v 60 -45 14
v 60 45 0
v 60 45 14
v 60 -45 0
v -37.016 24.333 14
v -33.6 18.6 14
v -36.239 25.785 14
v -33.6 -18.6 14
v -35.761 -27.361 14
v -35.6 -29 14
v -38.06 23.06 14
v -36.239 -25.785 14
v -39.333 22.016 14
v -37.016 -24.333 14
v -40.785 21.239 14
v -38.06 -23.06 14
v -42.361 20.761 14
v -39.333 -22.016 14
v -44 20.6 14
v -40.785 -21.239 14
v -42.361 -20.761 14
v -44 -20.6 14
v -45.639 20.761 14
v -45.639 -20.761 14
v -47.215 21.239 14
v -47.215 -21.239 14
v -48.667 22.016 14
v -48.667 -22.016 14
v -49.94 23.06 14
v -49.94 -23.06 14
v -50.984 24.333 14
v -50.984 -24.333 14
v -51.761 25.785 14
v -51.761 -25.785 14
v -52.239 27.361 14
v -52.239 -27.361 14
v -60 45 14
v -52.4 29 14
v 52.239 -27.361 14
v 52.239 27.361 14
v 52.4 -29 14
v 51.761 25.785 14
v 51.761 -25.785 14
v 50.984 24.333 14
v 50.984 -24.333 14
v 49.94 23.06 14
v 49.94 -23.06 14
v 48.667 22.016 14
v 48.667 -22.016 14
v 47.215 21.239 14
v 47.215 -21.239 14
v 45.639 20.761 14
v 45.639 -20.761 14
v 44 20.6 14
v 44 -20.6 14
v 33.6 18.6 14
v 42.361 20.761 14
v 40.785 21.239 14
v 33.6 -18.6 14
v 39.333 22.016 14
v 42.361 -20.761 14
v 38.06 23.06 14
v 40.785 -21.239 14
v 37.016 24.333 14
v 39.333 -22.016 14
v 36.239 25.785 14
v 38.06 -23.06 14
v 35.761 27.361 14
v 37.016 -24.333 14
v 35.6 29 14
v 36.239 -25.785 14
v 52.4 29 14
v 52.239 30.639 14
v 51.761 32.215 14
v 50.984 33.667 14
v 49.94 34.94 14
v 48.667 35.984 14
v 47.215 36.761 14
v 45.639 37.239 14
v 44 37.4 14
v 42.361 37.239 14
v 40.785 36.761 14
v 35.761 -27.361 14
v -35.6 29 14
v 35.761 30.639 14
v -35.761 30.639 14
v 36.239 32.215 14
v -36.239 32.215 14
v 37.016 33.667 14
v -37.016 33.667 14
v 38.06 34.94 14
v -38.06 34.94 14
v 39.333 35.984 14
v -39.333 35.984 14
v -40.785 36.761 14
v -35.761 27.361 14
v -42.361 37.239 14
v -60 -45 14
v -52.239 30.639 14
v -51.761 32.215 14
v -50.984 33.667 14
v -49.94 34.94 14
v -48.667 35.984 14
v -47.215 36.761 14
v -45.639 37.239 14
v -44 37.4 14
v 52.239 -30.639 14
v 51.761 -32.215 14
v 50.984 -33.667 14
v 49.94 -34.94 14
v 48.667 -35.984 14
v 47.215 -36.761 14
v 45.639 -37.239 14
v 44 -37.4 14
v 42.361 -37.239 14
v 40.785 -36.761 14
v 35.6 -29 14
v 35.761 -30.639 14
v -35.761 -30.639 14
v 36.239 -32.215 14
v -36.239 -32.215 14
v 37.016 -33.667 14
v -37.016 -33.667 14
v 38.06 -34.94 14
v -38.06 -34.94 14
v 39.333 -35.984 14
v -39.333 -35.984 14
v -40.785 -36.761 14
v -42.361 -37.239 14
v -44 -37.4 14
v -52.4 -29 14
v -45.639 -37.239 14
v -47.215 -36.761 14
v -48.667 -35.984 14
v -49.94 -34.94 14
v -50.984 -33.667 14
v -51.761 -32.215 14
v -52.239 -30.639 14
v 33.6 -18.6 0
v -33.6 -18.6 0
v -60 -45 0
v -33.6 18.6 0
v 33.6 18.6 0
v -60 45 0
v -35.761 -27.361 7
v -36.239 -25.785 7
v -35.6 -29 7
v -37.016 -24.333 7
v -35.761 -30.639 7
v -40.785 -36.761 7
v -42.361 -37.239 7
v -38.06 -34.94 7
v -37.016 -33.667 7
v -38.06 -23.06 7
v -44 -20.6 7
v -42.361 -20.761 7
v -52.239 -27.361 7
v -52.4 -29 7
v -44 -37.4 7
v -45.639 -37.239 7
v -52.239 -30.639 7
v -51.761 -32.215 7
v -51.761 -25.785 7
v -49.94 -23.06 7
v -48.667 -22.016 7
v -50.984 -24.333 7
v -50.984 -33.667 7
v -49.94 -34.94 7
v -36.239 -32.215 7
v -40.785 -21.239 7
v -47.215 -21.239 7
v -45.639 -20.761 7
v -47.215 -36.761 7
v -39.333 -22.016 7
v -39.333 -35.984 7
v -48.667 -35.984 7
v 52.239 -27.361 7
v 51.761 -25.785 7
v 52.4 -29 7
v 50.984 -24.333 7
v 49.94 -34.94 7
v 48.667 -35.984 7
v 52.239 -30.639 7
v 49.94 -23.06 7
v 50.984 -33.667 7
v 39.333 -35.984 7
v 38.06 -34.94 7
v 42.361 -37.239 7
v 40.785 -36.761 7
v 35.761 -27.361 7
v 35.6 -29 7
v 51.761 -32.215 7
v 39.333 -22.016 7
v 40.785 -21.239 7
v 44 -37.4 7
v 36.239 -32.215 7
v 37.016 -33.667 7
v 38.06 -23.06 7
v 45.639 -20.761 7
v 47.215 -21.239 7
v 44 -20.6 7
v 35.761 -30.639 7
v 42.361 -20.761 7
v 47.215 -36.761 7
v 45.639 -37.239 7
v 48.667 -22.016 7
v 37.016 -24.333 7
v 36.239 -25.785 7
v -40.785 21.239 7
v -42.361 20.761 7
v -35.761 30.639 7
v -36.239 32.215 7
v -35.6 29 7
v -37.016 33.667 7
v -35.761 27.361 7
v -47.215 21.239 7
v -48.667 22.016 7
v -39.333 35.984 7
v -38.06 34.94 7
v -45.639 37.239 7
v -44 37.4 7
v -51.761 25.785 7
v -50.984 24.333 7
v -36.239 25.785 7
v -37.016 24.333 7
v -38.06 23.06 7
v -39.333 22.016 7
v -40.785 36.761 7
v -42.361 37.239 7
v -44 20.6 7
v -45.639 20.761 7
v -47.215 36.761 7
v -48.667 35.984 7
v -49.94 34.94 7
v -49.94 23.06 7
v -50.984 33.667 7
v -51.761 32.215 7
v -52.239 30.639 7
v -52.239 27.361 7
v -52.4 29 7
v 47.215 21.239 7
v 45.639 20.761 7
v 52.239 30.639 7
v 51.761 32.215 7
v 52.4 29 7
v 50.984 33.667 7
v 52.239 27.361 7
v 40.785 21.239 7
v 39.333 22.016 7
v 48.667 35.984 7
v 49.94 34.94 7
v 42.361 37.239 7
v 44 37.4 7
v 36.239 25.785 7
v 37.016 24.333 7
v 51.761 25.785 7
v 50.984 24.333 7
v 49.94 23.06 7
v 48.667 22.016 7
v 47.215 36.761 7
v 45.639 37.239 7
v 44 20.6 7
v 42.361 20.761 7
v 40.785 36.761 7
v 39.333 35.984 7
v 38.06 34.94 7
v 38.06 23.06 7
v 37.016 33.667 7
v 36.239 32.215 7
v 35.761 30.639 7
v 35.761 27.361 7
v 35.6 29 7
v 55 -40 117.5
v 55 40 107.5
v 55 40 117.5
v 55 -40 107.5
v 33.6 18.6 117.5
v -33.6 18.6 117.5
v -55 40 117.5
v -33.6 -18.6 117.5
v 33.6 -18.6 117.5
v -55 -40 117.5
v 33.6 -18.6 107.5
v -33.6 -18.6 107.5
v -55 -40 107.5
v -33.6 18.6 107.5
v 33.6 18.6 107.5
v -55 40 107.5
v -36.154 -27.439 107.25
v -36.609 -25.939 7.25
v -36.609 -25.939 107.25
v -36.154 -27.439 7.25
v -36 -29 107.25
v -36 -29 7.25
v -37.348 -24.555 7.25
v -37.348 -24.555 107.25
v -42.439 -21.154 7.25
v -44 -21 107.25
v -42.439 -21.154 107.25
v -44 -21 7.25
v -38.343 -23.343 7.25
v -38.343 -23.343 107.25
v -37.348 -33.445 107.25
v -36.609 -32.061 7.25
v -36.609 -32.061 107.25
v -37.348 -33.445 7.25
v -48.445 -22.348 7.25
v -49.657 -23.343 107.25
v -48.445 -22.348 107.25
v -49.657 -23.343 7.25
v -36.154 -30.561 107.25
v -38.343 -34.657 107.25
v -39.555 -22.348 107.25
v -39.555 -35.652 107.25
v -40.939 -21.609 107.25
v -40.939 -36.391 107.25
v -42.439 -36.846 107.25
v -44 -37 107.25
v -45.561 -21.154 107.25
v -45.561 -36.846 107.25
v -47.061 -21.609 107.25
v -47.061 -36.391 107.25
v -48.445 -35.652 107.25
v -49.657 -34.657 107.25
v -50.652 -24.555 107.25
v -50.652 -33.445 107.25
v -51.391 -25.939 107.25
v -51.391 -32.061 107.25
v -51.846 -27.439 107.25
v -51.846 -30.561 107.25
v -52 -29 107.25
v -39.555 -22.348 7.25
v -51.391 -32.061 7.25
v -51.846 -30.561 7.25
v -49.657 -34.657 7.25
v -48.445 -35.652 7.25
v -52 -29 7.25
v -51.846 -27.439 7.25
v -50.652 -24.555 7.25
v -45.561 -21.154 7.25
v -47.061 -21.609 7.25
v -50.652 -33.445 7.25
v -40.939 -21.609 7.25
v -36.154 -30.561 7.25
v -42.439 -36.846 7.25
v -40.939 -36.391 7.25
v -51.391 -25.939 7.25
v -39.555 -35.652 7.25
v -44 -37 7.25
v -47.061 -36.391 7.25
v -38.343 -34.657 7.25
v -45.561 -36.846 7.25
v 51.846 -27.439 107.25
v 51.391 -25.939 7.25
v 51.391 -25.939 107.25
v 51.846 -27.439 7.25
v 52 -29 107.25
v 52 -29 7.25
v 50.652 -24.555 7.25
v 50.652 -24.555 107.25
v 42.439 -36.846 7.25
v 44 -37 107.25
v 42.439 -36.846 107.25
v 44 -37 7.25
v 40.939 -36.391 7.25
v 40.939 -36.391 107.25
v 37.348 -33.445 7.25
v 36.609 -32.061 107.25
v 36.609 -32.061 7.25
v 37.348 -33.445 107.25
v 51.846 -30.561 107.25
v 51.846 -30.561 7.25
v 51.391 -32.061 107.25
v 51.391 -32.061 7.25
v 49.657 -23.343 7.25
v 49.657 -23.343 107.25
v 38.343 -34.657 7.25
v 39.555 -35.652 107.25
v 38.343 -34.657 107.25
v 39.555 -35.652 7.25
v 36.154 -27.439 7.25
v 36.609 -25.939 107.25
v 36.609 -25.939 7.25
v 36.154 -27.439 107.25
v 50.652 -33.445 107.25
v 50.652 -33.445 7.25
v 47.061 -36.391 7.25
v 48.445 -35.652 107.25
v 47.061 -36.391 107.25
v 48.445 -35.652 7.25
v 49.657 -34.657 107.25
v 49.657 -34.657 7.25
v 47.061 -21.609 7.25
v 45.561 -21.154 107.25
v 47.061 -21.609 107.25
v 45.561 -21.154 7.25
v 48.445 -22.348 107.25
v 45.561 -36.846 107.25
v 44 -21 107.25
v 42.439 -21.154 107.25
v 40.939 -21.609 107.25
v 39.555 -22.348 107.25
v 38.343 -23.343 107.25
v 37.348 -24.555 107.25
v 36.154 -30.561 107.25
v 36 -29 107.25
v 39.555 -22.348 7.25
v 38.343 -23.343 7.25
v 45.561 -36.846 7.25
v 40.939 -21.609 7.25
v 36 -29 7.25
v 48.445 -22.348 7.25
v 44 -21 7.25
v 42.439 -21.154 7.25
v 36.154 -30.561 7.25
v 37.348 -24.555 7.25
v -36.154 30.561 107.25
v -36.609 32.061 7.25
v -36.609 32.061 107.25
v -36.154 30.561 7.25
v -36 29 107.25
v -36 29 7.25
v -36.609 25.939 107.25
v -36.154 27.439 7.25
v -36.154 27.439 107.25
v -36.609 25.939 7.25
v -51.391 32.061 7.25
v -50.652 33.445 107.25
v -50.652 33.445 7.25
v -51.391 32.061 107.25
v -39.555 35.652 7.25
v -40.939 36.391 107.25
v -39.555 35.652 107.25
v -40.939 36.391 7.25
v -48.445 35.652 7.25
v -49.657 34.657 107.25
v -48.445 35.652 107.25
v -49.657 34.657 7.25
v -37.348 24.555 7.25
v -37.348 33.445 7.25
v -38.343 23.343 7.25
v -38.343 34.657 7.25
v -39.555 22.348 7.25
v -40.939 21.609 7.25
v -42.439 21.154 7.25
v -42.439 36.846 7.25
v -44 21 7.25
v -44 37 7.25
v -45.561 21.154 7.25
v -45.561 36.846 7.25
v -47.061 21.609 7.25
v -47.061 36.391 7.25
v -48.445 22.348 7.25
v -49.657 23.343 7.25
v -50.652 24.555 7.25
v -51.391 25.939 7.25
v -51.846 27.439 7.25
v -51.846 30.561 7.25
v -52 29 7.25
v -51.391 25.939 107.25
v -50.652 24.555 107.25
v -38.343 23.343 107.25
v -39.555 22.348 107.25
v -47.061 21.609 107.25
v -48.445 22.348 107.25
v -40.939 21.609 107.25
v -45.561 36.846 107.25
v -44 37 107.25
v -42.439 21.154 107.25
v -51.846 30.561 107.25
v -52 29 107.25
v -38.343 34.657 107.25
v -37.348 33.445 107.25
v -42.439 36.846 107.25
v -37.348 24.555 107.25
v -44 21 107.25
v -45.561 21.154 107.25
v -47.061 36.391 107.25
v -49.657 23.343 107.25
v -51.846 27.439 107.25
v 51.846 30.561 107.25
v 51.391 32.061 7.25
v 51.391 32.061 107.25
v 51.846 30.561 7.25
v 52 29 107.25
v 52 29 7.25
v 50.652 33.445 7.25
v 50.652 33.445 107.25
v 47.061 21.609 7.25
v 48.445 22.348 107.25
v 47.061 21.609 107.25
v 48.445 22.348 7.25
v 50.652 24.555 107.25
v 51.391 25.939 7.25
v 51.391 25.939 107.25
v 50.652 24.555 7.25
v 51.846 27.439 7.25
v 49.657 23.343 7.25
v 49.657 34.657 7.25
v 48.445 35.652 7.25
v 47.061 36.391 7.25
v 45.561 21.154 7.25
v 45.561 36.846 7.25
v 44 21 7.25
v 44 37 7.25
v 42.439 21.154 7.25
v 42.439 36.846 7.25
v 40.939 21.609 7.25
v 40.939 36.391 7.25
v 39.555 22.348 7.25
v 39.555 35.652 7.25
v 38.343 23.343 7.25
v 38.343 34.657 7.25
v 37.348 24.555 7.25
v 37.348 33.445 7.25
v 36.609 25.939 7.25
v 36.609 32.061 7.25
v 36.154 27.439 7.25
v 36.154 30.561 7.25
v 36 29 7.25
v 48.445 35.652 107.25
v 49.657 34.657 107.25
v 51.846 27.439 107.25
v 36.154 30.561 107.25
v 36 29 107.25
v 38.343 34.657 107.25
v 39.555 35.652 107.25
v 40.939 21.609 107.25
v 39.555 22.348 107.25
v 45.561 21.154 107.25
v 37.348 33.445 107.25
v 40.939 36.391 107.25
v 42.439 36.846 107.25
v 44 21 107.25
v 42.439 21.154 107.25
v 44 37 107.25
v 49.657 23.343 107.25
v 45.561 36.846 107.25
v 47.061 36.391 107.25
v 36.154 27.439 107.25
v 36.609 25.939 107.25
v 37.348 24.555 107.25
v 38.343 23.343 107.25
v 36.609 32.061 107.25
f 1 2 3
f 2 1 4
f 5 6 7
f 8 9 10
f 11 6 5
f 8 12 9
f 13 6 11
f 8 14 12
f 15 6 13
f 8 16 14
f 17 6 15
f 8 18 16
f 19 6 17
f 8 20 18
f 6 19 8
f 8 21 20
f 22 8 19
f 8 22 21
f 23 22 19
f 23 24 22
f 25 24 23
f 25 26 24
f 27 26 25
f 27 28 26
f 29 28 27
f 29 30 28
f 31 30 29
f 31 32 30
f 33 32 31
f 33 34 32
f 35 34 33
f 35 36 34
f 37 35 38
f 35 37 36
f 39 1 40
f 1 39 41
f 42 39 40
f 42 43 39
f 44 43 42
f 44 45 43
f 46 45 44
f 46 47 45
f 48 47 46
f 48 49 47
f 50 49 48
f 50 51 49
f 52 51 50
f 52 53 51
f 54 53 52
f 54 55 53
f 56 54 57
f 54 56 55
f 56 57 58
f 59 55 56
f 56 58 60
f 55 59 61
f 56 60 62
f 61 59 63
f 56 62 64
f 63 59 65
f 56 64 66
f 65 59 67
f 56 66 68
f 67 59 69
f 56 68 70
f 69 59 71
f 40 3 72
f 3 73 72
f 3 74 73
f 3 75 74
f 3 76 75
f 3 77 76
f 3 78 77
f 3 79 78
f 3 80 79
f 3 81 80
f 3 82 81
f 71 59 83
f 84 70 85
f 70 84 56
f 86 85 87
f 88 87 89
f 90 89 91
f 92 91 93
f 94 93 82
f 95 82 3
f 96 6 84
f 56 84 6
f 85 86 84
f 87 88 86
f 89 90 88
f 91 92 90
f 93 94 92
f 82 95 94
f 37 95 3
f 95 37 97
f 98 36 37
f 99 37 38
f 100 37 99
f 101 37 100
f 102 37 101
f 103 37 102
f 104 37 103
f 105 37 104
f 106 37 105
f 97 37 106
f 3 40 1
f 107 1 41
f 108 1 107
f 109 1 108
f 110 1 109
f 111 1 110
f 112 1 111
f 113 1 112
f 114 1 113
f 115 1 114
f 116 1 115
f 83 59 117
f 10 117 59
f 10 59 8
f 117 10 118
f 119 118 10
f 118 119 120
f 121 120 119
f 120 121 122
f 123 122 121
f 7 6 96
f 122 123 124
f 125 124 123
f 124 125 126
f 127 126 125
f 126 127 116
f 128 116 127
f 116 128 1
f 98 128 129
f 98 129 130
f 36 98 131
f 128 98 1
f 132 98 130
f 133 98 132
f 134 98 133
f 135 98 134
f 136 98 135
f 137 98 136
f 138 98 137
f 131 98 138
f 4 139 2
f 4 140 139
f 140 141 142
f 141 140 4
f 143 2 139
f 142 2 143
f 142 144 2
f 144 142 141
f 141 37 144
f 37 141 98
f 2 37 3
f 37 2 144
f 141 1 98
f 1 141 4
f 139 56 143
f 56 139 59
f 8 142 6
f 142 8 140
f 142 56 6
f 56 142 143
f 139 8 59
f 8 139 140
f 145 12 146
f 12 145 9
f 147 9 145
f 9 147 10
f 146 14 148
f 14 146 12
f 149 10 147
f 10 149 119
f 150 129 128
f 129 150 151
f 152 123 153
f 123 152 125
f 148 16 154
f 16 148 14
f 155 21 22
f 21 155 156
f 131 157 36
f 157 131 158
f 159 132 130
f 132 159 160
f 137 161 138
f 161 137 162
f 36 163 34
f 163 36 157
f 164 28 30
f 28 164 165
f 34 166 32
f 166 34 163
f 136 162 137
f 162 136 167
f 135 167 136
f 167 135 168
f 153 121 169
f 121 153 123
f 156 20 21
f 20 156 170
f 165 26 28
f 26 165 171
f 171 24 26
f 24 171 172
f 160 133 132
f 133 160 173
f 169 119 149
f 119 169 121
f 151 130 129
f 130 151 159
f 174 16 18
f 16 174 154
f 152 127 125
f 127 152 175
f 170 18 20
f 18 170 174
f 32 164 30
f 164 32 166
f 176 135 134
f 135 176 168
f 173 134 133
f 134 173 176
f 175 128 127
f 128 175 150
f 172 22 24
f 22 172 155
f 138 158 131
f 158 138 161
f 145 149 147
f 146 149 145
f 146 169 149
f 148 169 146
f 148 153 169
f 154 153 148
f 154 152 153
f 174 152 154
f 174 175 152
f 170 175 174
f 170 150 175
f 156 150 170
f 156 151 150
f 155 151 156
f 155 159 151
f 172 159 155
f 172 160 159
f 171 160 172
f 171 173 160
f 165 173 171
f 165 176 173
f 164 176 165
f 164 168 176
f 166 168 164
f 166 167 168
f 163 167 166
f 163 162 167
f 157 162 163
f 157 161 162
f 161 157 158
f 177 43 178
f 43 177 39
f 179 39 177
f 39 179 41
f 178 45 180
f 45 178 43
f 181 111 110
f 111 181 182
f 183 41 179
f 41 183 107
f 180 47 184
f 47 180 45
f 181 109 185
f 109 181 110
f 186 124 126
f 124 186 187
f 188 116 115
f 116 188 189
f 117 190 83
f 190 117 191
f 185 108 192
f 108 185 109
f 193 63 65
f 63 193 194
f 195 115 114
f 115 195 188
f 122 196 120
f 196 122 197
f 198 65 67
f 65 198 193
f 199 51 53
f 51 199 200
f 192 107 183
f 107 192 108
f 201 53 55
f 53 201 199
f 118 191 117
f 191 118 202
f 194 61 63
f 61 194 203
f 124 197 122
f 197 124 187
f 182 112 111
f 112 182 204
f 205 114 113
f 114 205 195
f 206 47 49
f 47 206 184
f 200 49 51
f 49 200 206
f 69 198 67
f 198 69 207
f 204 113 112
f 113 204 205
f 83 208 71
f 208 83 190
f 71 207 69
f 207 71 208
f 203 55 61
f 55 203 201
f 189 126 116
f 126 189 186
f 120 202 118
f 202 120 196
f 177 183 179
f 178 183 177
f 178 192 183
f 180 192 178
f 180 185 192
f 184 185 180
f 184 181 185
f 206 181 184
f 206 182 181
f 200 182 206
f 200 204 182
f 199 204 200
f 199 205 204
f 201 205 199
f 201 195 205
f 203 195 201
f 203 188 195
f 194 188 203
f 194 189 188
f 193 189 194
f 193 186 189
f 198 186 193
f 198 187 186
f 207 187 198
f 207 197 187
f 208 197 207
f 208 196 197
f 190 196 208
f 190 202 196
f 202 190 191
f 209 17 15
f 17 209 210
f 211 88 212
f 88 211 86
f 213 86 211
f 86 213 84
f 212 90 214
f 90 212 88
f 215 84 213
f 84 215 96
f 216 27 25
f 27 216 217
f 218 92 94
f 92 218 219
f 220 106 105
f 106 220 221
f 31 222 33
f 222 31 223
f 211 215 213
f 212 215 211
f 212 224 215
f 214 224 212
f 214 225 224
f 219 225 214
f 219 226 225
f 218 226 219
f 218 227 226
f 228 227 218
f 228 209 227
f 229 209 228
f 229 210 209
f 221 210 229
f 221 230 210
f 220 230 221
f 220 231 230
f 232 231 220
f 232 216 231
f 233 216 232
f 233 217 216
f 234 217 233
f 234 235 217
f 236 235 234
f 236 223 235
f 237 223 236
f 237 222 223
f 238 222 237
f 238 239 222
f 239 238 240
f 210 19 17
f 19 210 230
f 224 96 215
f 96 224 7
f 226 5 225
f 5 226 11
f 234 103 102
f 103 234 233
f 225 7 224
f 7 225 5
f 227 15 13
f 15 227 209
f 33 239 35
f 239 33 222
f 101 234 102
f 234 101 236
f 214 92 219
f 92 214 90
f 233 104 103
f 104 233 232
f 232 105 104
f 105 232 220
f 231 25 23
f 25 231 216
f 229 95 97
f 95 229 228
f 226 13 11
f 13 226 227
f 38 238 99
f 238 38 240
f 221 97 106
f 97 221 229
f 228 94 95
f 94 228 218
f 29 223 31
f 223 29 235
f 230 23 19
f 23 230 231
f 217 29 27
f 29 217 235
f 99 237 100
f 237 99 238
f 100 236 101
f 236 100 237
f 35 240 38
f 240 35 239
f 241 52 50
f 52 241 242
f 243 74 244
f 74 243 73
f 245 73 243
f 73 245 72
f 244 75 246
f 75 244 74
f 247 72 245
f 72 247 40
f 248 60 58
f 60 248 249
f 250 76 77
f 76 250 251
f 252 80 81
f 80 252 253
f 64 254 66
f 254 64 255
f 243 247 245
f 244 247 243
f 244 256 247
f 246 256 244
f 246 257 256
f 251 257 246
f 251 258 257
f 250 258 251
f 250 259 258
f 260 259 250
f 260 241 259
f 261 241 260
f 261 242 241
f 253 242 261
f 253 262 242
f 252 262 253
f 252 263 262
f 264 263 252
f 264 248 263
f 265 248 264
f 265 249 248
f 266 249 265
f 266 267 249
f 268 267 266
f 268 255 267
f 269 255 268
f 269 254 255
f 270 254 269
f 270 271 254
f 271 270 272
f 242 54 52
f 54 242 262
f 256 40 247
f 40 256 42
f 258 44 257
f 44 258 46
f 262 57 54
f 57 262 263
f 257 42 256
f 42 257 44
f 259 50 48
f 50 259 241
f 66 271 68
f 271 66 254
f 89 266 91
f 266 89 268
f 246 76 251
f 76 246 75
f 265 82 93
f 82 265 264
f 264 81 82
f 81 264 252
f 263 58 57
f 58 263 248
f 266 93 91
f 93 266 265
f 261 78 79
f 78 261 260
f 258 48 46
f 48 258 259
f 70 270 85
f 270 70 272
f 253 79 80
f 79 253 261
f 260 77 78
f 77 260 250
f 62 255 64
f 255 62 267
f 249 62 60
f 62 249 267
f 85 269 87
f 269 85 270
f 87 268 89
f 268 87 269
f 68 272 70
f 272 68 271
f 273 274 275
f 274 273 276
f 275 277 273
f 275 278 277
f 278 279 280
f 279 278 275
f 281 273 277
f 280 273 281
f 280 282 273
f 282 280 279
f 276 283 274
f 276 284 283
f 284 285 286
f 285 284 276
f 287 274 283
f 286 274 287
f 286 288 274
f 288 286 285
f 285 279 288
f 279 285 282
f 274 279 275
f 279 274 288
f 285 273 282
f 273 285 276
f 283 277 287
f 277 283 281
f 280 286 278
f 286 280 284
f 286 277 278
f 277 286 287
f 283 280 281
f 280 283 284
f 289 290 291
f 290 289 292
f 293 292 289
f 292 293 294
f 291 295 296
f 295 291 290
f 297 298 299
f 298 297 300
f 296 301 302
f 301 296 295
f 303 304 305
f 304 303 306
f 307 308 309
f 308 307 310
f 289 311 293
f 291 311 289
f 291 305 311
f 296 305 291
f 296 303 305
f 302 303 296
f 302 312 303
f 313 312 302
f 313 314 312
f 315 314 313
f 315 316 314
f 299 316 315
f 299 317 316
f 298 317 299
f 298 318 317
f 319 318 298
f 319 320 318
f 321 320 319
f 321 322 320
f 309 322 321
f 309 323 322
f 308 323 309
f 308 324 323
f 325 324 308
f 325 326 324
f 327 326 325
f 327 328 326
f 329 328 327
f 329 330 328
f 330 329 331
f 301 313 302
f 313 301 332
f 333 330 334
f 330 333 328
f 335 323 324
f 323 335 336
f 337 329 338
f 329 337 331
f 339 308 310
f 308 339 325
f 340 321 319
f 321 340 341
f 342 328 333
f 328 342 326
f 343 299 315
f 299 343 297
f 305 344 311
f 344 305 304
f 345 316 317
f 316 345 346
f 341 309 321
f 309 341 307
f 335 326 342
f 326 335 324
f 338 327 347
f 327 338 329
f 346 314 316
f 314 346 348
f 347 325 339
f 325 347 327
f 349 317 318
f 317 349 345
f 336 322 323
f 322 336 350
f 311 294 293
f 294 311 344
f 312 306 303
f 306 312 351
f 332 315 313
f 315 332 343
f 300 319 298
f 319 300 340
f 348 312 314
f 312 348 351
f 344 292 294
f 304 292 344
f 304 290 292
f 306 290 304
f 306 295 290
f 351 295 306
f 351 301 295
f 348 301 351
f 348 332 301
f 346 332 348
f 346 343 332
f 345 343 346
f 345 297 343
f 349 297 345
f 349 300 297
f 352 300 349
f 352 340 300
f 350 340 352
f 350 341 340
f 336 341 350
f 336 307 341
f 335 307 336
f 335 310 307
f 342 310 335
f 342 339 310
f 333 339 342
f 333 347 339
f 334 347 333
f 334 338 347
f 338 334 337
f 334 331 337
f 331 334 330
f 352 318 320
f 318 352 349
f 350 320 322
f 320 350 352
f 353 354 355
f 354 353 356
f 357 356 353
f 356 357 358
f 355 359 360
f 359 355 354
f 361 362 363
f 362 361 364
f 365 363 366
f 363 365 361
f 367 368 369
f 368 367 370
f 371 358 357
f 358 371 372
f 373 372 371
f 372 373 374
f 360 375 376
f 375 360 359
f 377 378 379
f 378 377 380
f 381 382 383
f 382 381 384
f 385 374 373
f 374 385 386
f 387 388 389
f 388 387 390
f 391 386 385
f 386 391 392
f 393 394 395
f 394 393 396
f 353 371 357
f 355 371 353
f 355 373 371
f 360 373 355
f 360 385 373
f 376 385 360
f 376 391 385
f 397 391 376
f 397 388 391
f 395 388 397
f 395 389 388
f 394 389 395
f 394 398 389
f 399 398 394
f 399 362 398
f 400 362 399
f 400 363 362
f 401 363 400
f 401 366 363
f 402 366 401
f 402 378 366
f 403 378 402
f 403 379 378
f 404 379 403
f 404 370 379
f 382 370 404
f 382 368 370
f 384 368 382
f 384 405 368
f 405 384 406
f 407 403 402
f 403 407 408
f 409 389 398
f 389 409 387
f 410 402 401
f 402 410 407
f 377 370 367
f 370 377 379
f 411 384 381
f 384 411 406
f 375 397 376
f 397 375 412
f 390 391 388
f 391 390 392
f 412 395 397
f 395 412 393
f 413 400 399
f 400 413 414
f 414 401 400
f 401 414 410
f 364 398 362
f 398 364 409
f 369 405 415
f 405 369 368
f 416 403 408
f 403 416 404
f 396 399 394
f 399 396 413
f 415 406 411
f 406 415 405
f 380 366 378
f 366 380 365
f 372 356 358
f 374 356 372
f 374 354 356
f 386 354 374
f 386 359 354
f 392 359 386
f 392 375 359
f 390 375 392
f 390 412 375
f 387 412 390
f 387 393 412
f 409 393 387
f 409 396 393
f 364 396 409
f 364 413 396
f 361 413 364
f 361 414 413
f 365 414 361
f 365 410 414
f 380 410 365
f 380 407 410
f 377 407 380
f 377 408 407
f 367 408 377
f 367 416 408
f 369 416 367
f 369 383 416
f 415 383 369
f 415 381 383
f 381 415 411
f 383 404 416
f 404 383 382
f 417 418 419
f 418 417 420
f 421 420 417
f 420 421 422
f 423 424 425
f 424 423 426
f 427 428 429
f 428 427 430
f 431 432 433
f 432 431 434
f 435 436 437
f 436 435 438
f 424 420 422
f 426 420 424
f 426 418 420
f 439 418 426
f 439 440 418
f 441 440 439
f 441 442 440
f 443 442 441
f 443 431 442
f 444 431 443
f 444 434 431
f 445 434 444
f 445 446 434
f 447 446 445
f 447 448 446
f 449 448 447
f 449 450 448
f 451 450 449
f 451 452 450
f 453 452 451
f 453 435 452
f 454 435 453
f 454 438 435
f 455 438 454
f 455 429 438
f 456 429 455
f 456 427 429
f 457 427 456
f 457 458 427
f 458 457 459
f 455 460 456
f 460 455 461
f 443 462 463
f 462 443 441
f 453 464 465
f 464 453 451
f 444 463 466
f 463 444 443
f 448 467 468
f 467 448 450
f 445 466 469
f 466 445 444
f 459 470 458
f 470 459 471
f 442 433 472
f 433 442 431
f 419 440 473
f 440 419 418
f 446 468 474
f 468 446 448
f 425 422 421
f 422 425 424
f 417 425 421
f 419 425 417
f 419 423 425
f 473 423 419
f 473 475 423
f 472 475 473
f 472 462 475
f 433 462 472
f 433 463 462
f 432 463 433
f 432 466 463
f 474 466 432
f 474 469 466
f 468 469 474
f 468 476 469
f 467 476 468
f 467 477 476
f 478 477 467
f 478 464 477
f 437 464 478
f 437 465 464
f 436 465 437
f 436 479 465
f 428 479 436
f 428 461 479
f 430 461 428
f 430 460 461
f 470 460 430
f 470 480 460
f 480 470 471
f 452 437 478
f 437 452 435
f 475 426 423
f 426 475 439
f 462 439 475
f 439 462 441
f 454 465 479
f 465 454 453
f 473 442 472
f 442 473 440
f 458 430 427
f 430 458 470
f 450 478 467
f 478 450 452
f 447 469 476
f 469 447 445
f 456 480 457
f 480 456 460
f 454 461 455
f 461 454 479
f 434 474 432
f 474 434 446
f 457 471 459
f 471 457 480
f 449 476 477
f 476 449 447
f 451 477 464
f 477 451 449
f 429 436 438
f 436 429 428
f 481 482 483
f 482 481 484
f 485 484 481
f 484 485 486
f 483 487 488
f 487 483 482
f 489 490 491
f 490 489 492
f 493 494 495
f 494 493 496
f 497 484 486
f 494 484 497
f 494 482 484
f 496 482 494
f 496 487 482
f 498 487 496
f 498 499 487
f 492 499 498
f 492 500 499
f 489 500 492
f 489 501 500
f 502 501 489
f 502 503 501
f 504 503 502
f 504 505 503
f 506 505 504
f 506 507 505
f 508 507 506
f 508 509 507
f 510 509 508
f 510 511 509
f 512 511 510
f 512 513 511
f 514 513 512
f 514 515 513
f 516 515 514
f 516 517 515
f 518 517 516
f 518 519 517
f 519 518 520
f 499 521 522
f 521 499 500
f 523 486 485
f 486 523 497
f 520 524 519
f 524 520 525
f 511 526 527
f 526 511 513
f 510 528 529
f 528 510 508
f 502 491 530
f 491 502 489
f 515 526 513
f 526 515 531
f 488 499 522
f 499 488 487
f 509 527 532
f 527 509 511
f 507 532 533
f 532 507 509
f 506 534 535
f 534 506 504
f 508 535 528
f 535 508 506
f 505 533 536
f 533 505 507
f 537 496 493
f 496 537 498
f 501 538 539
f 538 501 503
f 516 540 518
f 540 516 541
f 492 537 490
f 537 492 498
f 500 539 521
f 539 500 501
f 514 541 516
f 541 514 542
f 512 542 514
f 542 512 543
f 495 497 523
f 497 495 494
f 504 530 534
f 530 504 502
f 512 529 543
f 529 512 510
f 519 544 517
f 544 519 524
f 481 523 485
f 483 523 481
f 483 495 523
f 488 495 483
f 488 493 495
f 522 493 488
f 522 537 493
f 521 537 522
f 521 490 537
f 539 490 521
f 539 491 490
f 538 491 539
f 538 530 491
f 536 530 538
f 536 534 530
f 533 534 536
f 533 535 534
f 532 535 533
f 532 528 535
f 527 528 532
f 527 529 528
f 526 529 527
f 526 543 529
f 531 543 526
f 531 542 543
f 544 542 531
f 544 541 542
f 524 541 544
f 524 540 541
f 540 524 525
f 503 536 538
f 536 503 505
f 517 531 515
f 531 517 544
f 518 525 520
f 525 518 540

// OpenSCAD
$fn = 32;

// ------------------------------------------------------------------------
// Frame cube: base 120 x 90 mm, posts 100 mm tall
// Every part is its own module, assembly() places every instance.
// ------------------------------------------------------------------------

// --- part 1 ---
module base_frame() {
  difference() {
    translate([-60, -45, 0]) cube([120, 90, 14]);
    translate([-33.6, -18.6, -1]) cube([67.2, 37.2, 16]);
    translate([-44, -29, 7]) cylinder(h = 8, d = 16.8);
    translate([44, -29, 7]) cylinder(h = 8, d = 16.8);
    translate([-44, 29, 7]) cylinder(h = 8, d = 16.8);
    translate([44, 29, 7]) cylinder(h = 8, d = 16.8);
  }
}

// --- part 2 ---
module corner_post() {
  cylinder(h = 100, d = 16);
}

// --- part 3 ---
module top_frame() {
  difference() {
    translate([-55, -40, 0]) cube([110, 80, 10]);
    translate([-33.6, -18.6, -1]) cube([67.2, 37.2, 12]);
  }
}

// --- assembly ---
module assembly() {
  color([0.80, 0.24, 0.20]) translate([0, 0, 0]) rotate([0, 0, 0]) base_frame();
  color([0.20, 0.45, 0.75]) translate([-44, -29, 7.25]) rotate([0, 0, 0]) corner_post();
  color([0.25, 0.62, 0.32]) translate([44, -29, 7.25]) rotate([0, 0, 0]) corner_post();
  color([0.92, 0.70, 0.18]) translate([-44, 29, 7.25]) rotate([0, 0, 0]) corner_post();
  color([0.58, 0.35, 0.70]) translate([44, 29, 7.25]) rotate([0, 0, 0]) corner_post();
  color([0.16, 0.66, 0.66]) translate([0, 0, 107.5]) rotate([0, 0, 0]) top_frame();
}

assembly();
